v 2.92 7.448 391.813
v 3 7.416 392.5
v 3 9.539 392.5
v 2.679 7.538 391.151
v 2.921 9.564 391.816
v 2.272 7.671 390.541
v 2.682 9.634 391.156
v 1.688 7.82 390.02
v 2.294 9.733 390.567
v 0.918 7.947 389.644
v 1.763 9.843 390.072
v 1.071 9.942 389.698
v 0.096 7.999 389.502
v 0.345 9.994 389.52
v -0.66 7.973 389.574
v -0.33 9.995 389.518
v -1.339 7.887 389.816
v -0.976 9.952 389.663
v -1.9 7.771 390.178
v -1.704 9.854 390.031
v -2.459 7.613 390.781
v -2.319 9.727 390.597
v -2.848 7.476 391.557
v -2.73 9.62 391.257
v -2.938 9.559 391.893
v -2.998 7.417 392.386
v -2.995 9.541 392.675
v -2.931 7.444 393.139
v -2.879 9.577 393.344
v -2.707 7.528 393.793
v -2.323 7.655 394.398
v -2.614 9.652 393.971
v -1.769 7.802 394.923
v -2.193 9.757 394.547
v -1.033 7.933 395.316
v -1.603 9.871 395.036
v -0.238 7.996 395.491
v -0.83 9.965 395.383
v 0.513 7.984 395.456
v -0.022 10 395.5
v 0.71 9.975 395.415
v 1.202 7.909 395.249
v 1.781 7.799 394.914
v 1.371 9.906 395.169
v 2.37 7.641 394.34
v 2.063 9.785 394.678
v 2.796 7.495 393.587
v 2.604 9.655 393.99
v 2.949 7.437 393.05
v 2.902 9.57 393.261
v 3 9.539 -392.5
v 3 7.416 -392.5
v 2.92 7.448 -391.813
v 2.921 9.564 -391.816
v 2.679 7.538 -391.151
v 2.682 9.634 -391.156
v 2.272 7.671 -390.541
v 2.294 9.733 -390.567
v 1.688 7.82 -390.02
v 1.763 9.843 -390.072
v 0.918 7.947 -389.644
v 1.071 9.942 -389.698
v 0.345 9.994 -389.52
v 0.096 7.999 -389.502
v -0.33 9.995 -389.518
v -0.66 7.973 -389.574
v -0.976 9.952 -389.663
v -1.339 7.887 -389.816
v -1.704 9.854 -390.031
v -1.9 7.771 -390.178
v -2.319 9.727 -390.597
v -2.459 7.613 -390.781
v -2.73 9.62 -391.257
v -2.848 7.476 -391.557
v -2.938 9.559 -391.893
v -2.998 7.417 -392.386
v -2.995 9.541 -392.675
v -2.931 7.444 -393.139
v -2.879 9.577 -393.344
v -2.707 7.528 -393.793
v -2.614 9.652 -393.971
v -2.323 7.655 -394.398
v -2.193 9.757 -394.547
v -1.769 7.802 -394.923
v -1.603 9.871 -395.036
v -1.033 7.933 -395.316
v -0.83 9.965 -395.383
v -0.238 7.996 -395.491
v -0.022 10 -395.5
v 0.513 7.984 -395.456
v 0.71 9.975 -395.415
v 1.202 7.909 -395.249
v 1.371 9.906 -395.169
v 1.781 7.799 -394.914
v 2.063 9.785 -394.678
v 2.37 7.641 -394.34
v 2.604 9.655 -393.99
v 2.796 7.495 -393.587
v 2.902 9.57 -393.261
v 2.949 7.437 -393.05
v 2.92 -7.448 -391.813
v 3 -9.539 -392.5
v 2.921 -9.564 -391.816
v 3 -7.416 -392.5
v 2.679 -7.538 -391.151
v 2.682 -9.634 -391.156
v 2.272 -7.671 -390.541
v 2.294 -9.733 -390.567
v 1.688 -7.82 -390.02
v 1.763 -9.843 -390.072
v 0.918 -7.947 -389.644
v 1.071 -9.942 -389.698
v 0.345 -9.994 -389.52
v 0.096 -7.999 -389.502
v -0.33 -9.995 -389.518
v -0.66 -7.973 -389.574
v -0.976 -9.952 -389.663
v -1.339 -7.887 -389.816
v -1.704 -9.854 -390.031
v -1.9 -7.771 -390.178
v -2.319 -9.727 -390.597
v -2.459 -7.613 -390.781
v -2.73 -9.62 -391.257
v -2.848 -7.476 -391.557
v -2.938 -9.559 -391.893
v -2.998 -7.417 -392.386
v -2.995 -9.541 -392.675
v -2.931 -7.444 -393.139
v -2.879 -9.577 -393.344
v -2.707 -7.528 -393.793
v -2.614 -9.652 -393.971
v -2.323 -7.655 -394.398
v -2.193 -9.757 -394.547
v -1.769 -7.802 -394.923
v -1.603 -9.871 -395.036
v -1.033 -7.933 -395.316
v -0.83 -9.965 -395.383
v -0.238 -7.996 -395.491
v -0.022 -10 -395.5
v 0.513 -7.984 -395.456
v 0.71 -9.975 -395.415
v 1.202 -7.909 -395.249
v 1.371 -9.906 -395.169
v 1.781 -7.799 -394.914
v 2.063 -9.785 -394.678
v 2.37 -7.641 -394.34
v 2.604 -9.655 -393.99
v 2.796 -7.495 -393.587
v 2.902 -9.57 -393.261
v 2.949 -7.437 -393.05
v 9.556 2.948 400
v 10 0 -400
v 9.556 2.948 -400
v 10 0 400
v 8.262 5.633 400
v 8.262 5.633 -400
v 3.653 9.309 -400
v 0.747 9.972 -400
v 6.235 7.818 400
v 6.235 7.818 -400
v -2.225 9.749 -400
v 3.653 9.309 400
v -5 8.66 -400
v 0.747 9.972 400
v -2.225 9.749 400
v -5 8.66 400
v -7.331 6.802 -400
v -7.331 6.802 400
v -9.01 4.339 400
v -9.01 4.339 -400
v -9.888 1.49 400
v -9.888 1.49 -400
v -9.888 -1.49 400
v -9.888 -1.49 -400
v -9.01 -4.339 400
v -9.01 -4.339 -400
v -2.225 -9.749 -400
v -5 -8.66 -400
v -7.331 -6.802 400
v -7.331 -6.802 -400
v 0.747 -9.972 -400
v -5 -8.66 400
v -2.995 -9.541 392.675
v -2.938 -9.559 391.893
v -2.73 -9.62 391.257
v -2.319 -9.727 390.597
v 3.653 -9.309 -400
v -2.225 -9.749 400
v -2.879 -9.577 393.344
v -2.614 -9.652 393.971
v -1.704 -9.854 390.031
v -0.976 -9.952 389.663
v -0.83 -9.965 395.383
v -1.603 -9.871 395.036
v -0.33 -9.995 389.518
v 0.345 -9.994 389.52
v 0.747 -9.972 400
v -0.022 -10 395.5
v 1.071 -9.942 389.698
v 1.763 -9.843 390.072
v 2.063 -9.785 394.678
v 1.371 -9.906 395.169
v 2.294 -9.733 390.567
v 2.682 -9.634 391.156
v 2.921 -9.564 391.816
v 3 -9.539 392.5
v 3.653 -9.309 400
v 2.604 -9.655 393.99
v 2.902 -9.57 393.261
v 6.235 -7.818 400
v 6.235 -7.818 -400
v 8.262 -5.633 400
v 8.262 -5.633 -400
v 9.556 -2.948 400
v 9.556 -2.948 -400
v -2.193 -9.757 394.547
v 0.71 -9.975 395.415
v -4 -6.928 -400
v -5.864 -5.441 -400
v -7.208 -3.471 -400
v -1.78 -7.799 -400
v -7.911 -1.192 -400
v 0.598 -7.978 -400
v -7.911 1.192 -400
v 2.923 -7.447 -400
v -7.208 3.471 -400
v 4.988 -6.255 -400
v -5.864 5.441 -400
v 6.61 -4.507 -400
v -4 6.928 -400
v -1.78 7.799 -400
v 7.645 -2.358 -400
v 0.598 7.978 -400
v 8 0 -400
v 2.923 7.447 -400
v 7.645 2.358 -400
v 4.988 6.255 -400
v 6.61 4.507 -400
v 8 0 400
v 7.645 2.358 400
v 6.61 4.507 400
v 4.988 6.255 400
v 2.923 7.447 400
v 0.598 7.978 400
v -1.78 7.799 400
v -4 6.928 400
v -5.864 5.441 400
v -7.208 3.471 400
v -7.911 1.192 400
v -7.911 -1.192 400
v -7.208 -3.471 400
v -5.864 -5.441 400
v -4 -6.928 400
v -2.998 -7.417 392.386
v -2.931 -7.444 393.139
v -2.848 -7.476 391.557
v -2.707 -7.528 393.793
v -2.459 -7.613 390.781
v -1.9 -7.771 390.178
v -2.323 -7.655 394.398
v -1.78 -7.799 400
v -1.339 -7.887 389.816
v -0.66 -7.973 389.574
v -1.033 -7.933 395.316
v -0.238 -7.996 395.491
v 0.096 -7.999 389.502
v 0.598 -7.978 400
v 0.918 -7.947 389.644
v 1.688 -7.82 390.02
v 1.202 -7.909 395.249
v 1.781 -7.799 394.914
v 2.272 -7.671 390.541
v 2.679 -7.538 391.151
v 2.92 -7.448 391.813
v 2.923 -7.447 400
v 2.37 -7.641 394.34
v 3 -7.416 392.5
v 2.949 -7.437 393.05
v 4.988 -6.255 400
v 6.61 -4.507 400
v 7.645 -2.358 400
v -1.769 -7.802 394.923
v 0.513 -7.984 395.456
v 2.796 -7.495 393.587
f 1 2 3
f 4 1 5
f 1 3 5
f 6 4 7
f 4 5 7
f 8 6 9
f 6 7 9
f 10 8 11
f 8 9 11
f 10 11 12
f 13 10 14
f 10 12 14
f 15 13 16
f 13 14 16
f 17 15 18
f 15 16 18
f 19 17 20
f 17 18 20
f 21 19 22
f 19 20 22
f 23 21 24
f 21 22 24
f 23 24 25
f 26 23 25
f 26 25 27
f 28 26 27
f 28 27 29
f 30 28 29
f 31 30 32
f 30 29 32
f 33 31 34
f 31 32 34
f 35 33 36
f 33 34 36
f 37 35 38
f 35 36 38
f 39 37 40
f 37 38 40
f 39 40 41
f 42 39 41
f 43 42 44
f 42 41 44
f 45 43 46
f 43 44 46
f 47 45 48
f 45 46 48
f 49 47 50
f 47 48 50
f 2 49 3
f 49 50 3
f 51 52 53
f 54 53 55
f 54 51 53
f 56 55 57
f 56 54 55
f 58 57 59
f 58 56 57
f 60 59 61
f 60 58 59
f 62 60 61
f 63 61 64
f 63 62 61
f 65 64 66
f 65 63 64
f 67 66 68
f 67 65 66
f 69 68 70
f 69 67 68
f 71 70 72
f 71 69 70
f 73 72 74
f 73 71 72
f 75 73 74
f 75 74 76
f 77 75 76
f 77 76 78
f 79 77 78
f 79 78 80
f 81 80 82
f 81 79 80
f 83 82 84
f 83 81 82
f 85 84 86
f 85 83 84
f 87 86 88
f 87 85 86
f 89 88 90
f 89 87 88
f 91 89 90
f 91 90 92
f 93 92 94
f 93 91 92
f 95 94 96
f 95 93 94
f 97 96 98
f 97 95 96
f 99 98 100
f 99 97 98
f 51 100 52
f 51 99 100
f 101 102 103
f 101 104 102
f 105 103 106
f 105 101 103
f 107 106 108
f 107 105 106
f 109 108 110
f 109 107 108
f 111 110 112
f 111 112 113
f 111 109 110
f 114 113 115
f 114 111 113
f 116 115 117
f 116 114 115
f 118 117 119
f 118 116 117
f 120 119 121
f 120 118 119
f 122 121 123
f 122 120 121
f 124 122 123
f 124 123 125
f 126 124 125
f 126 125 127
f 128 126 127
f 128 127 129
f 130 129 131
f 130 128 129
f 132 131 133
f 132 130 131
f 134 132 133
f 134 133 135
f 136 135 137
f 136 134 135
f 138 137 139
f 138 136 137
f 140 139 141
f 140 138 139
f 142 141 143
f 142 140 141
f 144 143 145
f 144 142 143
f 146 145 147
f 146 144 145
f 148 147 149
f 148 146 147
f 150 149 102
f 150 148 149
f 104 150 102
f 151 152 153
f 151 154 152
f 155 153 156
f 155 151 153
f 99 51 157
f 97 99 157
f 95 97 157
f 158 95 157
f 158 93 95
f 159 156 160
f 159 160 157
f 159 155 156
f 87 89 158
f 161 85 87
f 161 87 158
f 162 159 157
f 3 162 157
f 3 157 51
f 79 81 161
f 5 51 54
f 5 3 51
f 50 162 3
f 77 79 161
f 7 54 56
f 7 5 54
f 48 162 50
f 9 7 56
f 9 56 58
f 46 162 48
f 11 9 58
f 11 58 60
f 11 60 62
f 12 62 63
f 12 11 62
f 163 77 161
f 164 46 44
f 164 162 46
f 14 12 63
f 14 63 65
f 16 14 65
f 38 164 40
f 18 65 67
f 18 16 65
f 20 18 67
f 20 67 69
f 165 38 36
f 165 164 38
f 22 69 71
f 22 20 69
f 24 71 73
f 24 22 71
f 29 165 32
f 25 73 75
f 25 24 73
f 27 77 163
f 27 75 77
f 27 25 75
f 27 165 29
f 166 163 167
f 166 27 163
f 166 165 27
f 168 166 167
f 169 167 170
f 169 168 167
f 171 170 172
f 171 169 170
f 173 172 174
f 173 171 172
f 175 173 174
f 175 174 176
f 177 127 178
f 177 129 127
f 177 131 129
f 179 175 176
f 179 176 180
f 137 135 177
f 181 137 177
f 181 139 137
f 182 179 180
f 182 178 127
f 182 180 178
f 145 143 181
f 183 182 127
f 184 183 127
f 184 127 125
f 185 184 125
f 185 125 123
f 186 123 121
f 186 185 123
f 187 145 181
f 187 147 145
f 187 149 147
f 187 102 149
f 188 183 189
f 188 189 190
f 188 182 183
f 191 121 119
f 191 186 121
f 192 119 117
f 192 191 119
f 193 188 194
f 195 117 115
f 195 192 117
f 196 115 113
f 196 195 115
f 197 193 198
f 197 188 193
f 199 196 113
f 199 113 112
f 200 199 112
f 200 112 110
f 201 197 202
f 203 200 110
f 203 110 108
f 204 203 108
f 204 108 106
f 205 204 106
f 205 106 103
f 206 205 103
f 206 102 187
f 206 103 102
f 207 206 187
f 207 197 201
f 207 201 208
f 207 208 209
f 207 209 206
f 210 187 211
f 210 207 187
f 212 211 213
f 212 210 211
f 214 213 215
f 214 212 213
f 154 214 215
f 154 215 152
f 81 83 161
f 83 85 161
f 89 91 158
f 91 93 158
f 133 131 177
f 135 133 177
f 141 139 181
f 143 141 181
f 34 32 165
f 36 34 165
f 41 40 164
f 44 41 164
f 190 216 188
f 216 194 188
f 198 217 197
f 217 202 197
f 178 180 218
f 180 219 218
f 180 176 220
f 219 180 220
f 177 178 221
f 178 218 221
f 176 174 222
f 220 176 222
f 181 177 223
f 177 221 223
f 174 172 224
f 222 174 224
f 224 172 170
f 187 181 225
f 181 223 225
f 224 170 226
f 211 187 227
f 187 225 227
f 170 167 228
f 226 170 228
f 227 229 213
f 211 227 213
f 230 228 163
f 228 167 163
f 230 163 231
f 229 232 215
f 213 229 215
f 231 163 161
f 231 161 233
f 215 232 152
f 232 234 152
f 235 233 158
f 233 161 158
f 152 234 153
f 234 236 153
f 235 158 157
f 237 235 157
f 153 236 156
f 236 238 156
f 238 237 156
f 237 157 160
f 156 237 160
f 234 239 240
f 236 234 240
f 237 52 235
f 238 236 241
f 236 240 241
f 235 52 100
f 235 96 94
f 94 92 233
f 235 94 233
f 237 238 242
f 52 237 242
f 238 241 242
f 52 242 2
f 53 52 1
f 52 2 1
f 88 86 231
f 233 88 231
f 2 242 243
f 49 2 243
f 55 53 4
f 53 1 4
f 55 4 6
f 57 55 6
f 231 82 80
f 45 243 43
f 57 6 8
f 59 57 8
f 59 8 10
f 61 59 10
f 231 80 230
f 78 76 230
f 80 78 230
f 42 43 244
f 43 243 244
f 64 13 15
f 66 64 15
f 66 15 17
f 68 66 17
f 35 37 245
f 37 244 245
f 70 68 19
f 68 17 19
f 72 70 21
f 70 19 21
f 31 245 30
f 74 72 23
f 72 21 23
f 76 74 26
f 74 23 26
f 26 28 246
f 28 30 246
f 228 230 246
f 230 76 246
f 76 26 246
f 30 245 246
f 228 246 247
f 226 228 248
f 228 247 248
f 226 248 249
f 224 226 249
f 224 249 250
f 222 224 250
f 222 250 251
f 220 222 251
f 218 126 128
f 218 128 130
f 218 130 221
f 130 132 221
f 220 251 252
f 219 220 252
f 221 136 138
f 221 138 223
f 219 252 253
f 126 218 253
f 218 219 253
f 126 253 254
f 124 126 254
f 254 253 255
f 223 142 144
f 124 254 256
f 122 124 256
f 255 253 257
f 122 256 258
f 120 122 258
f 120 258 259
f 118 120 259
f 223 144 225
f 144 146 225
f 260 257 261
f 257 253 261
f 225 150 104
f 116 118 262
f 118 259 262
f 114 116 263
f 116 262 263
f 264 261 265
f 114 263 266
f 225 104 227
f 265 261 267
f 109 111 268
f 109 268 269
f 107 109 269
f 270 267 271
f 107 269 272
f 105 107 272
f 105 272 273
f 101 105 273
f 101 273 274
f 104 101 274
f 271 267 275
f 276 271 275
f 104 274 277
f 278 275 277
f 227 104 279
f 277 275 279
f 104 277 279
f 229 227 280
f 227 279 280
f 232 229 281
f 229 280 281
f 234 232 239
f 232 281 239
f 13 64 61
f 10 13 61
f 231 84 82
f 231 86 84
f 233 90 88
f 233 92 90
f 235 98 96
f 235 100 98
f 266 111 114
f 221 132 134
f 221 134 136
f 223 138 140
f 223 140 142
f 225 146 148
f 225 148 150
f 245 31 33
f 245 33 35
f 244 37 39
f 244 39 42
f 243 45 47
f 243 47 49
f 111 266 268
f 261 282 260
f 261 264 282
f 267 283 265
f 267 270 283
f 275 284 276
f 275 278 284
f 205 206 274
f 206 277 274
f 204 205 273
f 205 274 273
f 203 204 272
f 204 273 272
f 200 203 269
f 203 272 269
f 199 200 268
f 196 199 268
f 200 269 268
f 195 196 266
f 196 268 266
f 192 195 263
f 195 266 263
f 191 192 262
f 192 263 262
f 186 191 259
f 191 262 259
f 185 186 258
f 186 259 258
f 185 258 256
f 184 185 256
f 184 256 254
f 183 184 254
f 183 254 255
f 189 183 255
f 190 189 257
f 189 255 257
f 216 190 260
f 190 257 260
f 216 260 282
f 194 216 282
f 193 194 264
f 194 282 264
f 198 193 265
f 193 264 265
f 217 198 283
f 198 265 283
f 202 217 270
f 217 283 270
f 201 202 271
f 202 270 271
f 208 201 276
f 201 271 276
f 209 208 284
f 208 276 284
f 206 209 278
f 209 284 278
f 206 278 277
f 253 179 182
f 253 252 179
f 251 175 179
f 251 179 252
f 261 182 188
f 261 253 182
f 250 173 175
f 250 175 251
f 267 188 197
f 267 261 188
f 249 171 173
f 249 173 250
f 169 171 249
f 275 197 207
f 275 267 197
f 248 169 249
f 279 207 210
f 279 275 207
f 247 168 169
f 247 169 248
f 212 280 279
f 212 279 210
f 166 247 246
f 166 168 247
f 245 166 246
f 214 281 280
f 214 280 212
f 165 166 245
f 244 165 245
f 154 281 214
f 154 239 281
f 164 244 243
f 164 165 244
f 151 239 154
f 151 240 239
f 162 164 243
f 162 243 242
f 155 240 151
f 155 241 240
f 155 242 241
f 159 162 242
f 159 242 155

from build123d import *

# Parameters (mm, degrees)
SZKIC1_R                    = 10
DODANIE_WYCI_GNI_CIE2_DEPTH = 400
SZKIC3_R                    = 8
WYTNIJ_WYCI_GNI_CIE1_DEPTH  = 801
SZKIC4_R                    = 3
WYTNIJ_WYCI_GNI_CIE2_DEPTH  = 11


with BuildPart() as part:
    # Szkic1 → Dodanie-wyciągnięcie2 (new body, symmetric)
    with BuildSketch(Plane.XY):
        Circle(SZKIC1_R)
    extrude(amount=DODANIE_WYCI_GNI_CIE2_DEPTH, both=True)

    # Szkic3 → Wytnij-wyciągnięcie1 (cut, through all)
    with BuildSketch(Plane.XY.offset(400)):
        Circle(SZKIC3_R)
    extrude(amount=-WYTNIJ_WYCI_GNI_CIE1_DEPTH, mode=Mode.SUBTRACT)

    # Szkic4 → Wytnij-wyciągnięcie2 (cut, symmetric)
    with BuildSketch(Plane(origin=(0, 0, 0), x_dir=(1, 0, 0), z_dir=(0, 1, 0))):
        with Locations((0, -392.5)):
            Circle(SZKIC4_R)
    wytnij_wyci_gni_cie2 = extrude(amount=WYTNIJ_WYCI_GNI_CIE2_DEPTH, both=True, mode=Mode.SUBTRACT)

    # Lustro1: Wytnij-wyciągnięcie2 across plane
    add(wytnij_wyci_gni_cie2.mirror(Plane(origin=(0, 0, 0), x_dir=(1, 0, 0), z_dir=(0, 0, -1))), mode=Mode.SUBTRACT)


solid = part.part
